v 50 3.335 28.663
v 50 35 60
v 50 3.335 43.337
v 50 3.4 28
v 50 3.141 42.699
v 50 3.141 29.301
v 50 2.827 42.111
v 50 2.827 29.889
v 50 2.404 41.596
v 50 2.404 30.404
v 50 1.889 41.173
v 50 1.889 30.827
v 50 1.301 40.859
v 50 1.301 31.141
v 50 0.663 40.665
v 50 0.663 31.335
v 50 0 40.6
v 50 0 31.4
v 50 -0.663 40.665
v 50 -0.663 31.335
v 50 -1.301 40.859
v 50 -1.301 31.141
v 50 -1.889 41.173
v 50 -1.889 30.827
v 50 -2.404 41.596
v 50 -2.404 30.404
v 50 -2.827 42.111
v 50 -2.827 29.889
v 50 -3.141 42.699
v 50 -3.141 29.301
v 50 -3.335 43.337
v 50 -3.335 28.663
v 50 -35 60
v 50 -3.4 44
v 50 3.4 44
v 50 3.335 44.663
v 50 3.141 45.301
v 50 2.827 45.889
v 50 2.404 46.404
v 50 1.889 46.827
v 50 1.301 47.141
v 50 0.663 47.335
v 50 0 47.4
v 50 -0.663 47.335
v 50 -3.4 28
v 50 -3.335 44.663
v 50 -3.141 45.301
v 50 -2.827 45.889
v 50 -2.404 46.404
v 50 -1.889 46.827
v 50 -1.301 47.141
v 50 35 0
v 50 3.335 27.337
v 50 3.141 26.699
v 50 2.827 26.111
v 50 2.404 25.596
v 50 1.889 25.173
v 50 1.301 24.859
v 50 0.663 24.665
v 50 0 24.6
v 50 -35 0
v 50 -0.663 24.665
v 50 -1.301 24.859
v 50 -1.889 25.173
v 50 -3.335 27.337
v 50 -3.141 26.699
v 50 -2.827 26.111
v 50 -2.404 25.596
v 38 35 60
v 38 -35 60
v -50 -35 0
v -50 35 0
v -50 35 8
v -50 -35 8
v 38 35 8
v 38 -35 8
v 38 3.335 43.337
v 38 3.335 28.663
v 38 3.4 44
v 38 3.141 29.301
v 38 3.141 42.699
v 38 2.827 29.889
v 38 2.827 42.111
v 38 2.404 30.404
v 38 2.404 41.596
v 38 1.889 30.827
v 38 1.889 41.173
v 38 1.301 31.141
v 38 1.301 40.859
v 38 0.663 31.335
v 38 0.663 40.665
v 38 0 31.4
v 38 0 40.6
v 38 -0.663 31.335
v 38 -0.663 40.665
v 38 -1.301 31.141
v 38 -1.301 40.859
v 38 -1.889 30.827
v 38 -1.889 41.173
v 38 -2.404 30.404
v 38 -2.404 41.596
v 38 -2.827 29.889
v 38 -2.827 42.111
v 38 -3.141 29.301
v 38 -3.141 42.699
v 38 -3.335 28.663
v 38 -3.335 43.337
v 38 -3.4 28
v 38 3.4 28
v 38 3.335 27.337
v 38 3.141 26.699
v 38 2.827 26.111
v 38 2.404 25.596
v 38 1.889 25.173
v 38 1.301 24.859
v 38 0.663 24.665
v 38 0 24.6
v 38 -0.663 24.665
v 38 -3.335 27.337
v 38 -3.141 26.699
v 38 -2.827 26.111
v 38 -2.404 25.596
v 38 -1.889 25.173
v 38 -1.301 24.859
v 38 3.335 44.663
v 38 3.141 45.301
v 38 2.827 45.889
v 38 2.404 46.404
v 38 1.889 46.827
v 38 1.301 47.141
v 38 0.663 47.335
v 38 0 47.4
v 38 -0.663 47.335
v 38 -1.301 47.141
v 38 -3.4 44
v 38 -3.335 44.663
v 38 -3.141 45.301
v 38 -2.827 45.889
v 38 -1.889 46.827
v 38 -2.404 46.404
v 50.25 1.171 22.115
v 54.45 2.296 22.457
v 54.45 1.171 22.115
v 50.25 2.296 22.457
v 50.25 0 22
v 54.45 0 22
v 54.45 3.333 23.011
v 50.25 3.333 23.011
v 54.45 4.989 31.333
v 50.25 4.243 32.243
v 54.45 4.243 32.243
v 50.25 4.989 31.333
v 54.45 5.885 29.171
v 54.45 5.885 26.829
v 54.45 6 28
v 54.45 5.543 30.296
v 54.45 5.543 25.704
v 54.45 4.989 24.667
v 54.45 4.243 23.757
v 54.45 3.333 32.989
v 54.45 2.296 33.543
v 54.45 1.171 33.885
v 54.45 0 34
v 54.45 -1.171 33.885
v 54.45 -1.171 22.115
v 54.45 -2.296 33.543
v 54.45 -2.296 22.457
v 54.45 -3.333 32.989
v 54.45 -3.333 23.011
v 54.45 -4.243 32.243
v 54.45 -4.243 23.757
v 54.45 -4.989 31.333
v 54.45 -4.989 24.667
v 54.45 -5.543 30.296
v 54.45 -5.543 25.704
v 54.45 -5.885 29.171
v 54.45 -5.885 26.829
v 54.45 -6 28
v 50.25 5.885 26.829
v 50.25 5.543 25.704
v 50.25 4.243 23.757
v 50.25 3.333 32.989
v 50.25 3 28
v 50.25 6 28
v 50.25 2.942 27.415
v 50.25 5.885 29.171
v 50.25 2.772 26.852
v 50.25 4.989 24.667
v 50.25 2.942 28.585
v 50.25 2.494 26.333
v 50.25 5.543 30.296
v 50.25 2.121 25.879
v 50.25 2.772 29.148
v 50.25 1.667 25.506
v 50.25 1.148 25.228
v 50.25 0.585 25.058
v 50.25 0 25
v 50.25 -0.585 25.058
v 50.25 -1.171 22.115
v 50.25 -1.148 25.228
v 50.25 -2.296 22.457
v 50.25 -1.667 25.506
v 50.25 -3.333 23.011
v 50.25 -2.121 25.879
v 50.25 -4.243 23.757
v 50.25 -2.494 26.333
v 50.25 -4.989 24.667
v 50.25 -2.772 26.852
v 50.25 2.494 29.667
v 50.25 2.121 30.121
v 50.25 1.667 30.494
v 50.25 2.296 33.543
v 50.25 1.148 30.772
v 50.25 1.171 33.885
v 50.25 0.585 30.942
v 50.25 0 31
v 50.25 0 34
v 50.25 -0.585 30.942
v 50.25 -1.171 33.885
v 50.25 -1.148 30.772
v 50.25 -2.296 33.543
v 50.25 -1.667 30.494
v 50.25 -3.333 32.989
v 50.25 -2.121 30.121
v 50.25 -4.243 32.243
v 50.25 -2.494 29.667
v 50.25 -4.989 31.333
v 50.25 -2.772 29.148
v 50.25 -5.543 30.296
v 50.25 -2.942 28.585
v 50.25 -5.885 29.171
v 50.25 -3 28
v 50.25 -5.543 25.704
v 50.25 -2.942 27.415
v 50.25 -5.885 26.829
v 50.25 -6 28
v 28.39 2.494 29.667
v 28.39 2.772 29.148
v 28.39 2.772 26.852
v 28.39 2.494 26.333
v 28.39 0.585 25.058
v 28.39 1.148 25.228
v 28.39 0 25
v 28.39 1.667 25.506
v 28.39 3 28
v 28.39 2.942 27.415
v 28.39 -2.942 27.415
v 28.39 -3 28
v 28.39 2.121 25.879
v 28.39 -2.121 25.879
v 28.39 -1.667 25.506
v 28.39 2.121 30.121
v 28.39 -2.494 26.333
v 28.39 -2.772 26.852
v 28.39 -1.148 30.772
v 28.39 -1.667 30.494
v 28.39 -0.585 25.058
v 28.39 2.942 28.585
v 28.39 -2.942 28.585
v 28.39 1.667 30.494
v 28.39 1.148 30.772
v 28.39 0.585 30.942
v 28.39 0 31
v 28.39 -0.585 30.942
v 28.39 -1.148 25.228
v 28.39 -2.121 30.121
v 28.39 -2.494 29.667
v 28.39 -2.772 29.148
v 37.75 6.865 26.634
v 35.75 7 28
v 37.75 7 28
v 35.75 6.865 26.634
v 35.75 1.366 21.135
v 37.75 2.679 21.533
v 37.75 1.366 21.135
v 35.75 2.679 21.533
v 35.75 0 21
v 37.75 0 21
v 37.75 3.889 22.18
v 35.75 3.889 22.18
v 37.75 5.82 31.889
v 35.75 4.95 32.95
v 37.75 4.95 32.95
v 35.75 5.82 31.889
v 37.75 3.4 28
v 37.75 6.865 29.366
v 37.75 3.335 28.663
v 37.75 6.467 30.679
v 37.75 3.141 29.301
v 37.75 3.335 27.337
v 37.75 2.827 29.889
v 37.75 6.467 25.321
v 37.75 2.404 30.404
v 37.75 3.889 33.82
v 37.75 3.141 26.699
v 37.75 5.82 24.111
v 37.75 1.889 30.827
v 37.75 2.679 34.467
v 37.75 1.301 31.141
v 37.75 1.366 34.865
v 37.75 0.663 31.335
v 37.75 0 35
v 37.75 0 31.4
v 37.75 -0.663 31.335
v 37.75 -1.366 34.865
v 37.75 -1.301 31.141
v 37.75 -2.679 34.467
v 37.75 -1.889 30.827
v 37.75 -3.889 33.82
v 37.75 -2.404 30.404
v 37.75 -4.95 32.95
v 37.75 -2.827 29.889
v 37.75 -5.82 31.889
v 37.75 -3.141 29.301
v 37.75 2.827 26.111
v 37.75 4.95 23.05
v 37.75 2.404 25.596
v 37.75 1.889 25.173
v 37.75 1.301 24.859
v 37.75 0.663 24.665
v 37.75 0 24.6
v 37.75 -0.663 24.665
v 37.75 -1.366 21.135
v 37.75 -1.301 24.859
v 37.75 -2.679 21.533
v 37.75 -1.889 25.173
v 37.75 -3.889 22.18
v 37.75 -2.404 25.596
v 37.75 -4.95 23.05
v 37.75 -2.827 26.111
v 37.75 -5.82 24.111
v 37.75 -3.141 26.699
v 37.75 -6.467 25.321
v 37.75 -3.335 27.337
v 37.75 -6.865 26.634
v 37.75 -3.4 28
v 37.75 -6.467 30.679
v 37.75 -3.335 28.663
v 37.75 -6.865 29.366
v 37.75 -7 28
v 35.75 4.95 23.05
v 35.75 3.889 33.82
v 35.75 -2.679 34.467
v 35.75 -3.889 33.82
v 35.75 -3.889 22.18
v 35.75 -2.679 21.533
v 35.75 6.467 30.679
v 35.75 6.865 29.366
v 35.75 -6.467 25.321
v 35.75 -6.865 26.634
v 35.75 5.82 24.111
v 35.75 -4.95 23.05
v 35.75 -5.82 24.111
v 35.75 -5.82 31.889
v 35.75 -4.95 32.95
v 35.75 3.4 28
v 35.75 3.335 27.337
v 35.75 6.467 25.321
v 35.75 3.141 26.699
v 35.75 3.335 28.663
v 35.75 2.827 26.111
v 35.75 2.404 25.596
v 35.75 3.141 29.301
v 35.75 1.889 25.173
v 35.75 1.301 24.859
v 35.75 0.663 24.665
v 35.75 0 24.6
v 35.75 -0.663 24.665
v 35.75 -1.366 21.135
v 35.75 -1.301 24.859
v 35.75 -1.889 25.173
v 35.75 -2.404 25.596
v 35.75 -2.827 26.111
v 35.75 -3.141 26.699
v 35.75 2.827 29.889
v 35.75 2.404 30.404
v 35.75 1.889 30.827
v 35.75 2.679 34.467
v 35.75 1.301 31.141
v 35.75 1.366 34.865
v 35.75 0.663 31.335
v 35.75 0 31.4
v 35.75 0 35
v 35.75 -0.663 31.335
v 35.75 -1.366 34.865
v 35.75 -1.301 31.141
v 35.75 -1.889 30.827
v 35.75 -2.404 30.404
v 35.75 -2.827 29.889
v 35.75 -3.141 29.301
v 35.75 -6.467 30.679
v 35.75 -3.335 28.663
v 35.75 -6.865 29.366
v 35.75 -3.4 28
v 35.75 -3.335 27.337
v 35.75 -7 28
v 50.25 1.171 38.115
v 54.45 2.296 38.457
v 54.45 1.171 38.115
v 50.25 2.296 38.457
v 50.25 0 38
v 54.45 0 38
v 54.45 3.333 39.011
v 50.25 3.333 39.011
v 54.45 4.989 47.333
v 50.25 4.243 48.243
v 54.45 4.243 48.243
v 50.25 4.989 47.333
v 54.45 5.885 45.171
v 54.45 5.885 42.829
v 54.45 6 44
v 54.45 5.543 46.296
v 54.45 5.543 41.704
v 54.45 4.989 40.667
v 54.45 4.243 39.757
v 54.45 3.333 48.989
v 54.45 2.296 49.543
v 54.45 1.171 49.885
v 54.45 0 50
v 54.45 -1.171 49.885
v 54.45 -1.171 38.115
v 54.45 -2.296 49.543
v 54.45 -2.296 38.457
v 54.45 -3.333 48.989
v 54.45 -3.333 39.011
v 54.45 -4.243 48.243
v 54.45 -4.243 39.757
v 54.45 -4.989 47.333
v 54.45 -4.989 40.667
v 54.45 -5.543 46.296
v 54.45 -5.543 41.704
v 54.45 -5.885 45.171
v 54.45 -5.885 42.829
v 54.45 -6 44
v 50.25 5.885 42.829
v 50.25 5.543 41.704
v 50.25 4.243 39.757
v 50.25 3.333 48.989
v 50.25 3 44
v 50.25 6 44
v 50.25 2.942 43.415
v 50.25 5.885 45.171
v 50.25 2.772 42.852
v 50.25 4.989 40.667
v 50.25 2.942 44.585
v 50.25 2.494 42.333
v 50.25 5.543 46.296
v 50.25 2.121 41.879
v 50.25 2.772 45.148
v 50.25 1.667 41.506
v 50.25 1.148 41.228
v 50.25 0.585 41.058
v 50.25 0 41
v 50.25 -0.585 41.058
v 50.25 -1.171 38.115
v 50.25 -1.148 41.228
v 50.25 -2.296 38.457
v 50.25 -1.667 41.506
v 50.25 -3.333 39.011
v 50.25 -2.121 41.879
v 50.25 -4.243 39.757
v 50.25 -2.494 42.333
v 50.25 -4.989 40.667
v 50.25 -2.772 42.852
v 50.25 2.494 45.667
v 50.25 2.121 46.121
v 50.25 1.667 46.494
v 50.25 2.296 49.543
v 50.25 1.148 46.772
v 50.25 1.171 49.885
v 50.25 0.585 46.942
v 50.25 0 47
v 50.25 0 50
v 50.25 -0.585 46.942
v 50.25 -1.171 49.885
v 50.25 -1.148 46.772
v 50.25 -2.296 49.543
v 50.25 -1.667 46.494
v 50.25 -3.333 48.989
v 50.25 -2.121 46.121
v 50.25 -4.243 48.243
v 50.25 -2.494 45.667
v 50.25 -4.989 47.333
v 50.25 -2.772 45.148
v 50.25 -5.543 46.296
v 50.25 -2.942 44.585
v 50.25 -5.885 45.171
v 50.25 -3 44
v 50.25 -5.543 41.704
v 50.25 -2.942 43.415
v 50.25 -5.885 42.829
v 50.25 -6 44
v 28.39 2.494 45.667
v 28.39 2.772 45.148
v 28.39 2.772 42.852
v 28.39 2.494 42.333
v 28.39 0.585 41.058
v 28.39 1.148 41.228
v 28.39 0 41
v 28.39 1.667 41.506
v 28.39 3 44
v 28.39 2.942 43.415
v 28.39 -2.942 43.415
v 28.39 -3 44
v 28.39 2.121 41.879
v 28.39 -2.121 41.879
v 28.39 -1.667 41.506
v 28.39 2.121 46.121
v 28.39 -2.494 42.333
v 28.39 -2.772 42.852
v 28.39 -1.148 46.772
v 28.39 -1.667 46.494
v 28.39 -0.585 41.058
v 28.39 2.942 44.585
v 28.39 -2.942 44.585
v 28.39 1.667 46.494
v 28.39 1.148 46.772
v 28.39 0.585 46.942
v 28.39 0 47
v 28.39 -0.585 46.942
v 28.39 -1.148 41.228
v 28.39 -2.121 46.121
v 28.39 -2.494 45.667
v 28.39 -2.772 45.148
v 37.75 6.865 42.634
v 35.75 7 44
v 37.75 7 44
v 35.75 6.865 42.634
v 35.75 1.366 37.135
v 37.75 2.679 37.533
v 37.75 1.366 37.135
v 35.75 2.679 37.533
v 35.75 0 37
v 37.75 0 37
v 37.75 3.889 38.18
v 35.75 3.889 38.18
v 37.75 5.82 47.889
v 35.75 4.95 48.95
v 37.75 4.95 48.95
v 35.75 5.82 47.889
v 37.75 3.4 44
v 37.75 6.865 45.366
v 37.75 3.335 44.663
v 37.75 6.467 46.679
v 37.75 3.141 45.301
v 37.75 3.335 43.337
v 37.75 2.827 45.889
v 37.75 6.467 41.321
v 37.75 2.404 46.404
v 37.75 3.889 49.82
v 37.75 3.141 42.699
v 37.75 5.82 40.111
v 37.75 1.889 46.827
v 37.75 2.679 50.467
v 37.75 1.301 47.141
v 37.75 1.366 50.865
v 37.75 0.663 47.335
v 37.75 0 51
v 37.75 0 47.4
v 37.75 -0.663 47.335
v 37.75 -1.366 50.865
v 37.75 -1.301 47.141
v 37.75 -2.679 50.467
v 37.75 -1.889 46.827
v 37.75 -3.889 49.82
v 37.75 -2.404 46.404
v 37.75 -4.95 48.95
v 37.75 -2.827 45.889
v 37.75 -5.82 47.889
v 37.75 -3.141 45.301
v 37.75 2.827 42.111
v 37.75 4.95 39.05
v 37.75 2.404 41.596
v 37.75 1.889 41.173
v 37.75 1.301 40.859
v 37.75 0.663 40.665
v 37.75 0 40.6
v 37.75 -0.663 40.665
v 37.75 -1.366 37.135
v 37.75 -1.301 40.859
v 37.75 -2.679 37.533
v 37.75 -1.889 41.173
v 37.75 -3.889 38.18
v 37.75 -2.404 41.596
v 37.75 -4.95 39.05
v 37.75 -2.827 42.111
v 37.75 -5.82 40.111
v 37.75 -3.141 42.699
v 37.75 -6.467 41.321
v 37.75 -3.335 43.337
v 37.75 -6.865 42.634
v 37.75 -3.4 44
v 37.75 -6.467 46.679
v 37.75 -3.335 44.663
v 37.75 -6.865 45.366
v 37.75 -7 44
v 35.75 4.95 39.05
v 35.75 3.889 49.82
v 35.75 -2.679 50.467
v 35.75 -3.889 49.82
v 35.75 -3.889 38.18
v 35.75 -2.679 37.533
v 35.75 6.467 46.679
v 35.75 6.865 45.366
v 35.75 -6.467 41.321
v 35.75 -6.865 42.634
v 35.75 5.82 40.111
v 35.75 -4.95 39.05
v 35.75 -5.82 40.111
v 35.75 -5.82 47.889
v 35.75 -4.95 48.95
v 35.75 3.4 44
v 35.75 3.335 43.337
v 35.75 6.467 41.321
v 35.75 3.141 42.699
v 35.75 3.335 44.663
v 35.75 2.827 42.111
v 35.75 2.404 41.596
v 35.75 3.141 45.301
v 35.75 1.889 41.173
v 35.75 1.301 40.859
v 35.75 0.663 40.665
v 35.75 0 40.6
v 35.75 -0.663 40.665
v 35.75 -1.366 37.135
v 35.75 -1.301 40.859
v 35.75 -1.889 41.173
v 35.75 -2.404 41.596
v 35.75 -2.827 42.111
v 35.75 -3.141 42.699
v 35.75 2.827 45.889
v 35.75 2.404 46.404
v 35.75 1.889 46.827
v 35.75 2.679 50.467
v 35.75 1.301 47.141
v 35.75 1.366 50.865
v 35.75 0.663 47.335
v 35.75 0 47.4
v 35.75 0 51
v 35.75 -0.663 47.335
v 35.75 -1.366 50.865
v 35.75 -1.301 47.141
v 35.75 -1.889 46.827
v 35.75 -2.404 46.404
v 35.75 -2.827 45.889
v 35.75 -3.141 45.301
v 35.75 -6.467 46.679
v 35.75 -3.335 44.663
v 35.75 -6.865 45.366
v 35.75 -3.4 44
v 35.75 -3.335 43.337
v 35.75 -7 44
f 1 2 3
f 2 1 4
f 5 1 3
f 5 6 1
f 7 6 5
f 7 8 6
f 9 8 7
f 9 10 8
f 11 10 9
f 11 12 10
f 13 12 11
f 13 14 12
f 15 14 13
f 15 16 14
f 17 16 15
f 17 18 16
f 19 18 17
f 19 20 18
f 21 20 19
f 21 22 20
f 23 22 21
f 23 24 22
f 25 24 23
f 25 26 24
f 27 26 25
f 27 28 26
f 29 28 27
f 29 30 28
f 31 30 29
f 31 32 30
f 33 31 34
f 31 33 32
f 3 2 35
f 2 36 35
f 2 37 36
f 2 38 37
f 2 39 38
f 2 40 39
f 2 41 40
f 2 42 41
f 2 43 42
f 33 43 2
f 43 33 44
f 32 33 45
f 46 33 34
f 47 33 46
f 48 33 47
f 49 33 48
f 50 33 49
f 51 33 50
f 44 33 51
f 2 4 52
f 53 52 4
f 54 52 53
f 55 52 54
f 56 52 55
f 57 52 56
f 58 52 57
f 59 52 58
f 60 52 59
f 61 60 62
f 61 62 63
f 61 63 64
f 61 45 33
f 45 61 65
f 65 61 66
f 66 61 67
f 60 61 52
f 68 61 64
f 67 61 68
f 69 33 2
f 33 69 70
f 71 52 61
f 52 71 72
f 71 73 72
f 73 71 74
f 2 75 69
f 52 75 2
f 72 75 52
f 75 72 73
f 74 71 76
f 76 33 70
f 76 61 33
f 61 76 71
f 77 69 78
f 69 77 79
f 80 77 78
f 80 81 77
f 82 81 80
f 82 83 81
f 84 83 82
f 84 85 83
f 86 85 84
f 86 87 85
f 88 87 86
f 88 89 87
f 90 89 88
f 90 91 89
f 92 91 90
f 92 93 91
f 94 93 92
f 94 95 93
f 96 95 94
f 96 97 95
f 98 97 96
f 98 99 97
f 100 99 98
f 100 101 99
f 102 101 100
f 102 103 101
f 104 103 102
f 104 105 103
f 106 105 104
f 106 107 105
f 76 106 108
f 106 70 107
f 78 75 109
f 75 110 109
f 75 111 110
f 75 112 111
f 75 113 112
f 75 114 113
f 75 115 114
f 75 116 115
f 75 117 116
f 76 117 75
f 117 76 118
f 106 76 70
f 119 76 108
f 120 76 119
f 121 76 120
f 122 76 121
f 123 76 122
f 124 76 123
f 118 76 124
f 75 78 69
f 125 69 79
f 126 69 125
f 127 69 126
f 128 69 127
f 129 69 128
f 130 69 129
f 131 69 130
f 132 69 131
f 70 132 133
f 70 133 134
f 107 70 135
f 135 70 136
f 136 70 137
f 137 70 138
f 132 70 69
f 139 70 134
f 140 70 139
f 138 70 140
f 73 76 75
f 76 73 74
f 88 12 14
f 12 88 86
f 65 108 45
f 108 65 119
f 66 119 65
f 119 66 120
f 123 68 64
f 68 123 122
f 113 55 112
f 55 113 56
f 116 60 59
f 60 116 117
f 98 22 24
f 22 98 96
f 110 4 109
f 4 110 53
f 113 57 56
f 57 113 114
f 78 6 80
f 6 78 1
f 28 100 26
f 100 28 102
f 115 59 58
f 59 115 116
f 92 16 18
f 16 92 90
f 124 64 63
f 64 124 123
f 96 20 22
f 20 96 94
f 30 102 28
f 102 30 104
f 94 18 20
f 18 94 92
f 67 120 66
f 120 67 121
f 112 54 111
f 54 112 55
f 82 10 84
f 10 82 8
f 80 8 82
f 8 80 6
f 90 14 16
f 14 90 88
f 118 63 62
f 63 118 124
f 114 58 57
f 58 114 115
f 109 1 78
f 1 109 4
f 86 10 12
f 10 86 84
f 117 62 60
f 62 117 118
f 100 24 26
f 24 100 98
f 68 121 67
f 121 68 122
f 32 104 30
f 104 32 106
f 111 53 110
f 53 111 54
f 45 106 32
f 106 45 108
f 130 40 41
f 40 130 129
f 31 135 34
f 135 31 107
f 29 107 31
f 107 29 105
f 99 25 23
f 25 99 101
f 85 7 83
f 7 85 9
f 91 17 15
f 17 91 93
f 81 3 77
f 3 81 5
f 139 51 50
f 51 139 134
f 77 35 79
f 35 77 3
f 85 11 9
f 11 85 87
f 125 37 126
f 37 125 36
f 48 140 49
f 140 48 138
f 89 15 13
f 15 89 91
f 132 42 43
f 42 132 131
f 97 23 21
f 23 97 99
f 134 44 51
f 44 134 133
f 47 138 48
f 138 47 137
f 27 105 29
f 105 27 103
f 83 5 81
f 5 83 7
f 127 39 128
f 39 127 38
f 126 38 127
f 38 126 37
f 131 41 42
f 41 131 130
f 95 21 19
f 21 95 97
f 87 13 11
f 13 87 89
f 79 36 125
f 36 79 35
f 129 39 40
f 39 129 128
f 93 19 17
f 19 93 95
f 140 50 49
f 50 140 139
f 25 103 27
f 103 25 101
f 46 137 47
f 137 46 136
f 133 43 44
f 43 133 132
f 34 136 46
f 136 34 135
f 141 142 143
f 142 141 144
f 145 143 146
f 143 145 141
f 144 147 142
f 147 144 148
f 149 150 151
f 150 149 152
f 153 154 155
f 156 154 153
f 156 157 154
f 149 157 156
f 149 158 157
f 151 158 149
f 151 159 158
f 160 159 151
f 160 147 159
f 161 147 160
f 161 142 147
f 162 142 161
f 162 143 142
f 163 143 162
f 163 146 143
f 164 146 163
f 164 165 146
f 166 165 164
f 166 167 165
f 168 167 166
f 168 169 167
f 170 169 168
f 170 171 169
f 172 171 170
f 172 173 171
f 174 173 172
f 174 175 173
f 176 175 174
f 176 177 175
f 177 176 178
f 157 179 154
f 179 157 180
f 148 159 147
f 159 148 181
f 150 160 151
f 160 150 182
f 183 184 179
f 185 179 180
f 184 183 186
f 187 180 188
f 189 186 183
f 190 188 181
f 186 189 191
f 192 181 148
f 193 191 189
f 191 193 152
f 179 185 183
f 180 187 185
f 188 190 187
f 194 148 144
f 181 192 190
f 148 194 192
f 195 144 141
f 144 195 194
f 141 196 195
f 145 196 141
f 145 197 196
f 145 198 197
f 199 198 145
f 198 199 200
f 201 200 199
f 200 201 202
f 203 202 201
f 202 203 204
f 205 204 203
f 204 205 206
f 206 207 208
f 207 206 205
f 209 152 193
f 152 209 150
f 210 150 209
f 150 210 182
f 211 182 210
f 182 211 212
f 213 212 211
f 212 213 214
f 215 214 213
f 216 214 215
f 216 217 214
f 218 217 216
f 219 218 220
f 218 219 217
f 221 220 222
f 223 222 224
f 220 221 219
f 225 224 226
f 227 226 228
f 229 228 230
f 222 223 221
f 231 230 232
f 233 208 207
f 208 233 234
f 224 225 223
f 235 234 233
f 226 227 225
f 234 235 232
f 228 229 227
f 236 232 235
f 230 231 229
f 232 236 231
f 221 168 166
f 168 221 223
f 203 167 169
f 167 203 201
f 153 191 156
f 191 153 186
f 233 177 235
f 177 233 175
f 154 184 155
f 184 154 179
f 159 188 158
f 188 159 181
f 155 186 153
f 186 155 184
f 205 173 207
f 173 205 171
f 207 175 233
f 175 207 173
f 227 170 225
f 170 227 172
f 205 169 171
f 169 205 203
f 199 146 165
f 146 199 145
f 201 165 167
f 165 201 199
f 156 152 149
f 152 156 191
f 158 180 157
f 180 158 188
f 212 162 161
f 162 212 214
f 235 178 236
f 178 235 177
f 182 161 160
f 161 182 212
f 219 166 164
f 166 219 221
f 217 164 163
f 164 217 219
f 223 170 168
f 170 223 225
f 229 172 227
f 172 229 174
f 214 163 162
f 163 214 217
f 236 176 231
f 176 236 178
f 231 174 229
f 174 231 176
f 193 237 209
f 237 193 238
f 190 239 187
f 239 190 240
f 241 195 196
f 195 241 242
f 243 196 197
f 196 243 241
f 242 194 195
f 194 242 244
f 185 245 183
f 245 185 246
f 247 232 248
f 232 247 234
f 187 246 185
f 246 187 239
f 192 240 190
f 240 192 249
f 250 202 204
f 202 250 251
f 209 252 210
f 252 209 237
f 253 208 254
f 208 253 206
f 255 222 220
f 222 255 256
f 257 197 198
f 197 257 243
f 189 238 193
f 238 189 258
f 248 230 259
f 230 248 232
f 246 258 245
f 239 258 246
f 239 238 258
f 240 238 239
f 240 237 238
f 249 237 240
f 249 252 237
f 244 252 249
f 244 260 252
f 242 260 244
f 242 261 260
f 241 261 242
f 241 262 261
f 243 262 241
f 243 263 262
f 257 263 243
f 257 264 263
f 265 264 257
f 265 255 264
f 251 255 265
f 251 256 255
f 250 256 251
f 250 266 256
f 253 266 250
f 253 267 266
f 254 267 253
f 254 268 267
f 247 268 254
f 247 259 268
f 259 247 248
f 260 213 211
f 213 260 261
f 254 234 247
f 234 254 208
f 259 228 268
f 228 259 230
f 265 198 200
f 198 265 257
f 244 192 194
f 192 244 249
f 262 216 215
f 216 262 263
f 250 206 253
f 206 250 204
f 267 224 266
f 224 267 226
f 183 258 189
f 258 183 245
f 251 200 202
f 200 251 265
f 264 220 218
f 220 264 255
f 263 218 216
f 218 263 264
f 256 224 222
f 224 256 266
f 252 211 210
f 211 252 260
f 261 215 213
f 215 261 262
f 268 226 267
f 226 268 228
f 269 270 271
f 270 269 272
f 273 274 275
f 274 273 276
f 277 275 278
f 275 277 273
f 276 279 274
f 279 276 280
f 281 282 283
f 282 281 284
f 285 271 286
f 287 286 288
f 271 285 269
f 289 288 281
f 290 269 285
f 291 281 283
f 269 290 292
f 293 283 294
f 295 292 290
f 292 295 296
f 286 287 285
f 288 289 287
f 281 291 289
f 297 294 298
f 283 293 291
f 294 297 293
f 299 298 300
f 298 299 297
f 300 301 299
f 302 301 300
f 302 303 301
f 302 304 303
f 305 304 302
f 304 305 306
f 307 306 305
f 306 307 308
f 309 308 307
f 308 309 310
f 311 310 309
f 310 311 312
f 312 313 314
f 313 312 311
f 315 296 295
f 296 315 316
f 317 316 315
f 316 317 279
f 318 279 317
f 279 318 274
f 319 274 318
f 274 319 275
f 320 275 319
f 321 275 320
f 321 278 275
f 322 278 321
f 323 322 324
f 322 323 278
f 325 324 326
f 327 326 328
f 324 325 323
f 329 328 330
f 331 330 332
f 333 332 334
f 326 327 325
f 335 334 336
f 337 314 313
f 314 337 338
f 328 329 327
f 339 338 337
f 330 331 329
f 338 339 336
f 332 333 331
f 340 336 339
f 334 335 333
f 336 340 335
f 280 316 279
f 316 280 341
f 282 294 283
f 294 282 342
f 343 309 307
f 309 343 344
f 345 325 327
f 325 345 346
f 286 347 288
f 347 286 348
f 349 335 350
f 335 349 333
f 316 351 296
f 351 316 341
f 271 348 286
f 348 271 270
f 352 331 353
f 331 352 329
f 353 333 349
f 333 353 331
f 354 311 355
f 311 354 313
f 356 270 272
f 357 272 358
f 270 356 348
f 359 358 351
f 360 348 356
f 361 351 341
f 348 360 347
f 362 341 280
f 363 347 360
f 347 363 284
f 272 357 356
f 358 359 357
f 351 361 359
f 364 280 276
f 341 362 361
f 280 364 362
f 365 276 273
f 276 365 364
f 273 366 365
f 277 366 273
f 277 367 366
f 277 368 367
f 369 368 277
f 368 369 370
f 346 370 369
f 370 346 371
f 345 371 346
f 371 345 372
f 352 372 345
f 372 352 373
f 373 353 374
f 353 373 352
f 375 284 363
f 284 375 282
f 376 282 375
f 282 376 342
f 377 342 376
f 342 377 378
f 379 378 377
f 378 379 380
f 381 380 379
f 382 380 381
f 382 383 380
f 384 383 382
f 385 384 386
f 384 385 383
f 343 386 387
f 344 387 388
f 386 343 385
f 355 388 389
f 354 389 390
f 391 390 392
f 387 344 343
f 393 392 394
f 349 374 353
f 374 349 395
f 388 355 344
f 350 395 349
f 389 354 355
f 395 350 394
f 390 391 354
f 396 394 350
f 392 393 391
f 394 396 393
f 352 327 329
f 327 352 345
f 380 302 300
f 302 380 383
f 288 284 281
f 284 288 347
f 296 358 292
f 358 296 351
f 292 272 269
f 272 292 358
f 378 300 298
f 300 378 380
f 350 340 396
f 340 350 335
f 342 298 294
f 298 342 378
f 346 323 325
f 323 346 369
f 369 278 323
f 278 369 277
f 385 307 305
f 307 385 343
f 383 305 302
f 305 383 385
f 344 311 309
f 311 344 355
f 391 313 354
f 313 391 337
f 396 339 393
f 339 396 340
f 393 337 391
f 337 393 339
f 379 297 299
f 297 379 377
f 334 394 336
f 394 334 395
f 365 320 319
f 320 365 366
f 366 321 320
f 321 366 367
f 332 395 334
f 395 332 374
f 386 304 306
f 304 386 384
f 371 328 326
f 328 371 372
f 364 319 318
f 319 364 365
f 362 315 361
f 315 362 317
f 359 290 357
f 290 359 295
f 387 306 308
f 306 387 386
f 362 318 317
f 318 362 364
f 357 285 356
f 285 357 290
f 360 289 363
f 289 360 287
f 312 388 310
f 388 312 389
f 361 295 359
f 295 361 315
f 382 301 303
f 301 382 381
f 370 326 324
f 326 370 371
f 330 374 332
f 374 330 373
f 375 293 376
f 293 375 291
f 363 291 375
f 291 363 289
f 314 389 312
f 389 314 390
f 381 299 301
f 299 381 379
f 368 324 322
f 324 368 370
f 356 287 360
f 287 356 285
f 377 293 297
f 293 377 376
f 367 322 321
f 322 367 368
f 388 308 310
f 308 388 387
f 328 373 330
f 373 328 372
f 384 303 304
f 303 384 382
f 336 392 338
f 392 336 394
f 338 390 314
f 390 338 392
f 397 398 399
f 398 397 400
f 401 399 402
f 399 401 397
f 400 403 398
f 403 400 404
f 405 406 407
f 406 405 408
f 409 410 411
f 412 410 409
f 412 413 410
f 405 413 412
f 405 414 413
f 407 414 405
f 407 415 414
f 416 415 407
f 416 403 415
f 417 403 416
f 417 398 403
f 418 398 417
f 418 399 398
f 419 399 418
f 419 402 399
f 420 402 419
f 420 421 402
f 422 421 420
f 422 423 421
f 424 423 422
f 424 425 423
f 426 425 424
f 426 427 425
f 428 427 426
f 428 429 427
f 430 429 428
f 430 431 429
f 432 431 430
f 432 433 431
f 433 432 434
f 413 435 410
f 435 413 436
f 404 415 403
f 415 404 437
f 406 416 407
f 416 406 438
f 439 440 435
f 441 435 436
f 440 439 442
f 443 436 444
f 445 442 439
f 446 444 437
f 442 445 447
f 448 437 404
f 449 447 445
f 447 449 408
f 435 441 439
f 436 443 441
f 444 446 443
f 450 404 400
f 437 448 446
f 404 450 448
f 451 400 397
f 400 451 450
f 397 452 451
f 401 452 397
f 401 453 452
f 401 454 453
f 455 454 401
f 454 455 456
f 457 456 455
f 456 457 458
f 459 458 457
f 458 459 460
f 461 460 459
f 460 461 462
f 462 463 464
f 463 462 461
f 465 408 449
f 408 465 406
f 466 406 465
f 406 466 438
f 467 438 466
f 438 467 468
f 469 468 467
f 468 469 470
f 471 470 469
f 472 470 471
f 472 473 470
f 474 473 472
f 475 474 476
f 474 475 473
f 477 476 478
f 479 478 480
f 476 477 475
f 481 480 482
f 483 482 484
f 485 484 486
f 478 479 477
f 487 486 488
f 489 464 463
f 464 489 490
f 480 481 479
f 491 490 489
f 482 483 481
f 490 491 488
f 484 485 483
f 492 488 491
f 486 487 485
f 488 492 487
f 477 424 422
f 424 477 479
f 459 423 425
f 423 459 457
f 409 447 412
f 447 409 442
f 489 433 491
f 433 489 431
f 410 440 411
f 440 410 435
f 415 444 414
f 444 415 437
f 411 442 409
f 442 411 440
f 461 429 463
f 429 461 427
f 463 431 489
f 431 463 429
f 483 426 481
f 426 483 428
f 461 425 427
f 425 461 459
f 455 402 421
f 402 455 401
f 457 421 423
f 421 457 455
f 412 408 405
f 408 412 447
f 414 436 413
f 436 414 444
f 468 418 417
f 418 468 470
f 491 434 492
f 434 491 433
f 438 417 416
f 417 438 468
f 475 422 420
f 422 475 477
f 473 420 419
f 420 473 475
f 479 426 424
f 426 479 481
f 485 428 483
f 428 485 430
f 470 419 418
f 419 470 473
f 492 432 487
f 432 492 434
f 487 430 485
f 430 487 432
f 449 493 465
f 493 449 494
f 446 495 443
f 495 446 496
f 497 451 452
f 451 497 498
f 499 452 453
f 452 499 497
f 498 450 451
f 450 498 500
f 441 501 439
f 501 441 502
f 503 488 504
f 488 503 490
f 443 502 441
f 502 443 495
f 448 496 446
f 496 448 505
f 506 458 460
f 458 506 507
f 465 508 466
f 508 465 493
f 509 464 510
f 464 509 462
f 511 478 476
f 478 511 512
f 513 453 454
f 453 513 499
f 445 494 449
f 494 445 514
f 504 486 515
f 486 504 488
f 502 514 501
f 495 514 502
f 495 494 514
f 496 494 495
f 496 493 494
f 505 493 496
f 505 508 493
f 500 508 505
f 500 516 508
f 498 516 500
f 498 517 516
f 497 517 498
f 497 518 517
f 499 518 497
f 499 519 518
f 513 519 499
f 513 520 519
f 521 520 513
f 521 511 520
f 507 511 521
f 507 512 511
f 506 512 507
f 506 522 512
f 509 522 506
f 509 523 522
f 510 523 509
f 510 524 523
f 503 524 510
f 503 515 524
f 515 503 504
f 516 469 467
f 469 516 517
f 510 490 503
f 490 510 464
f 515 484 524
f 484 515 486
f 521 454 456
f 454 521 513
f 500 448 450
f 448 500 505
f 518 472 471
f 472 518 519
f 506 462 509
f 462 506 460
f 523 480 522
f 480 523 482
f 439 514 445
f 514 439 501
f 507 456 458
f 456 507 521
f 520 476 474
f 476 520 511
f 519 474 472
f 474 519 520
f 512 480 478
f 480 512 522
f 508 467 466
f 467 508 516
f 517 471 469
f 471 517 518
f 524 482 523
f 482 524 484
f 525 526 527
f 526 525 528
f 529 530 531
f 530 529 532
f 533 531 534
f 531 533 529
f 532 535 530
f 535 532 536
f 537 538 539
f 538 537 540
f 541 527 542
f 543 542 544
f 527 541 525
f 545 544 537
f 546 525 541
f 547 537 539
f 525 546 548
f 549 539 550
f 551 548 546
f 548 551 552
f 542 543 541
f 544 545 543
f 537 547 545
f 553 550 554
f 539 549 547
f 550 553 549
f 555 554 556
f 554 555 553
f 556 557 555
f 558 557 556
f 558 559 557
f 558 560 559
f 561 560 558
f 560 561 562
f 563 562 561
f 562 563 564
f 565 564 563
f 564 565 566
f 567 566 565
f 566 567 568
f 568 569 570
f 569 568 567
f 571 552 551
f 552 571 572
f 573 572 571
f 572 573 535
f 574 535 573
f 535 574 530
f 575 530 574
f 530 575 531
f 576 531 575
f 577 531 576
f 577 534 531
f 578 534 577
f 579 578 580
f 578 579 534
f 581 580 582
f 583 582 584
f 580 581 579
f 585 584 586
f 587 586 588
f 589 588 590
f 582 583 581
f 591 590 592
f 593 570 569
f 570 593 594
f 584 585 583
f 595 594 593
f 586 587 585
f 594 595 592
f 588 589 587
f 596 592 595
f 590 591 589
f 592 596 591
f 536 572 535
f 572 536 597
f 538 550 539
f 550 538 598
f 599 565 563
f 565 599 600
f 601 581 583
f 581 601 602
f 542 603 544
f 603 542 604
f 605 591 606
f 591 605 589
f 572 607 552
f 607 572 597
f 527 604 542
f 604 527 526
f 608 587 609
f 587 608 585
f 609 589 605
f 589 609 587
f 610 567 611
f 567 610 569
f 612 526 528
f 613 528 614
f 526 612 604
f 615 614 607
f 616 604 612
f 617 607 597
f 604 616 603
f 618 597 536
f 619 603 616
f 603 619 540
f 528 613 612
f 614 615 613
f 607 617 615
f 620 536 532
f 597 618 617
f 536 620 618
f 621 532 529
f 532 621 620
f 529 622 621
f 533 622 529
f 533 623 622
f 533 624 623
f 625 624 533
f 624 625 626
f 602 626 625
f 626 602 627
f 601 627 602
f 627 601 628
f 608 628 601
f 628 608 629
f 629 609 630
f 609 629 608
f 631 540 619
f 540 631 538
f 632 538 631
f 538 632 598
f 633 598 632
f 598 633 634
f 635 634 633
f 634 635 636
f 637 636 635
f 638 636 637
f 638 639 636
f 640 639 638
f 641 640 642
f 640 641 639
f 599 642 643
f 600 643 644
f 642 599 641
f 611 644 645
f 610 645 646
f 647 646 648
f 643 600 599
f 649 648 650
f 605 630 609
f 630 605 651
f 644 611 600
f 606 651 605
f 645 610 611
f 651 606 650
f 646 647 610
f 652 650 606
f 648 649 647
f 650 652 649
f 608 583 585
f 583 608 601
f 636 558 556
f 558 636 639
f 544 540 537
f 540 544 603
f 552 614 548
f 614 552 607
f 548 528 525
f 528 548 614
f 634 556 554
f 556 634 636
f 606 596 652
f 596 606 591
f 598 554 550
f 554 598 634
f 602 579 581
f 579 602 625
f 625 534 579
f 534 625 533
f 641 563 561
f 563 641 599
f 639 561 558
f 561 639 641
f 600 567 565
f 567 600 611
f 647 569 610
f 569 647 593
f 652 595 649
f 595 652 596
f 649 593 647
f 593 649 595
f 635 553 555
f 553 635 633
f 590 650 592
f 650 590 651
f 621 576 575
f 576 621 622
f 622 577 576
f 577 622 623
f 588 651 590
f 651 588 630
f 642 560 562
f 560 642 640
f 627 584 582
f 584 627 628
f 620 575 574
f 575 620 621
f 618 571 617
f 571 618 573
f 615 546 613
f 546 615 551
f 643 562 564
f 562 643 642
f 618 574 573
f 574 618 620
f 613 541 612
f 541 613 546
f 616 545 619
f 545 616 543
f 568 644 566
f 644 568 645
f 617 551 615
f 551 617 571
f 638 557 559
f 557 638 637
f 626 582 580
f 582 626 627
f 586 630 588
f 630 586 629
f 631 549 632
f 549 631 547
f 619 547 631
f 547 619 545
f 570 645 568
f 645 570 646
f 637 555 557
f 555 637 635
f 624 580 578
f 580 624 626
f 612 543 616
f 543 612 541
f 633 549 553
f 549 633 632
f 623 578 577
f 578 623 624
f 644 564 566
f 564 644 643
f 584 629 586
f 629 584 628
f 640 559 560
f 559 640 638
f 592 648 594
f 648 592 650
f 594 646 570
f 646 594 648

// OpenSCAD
$fn = 32;

// ------------------------------------------------------------------------
// Bolted bracket: 100 x 70 mm bracket with 2 bolt joints
// Every part is its own module, assembly() places them once.
// ------------------------------------------------------------------------

// --- part 1 ---
module bracket() {
  difference() {
    translate([-50, -35, 0]) cube([100, 70, 60]);
    translate([-51, -36, 8]) cube([89, 72, 53]);
    translate([44, 0, 28]) rotate([0, 90, 0]) cylinder(h = 14, d = 6.8, center = true);
    translate([44, 0, 44]) rotate([0, 90, 0]) cylinder(h = 14, d = 6.8, center = true);
  }
}

// --- part 2 ---
module bolt1() {
  cylinder(h = 4.2, d = 12);
  translate([0, 0, -21.86]) cylinder(h = 21.86, d = 6);
}

// --- part 3 ---
module washer1() {
  difference() {
      translate([0, 0, 0]) cylinder(h = 2, d = 14);
      translate([0, 0, -1]) cylinder(h = 4, d = 6.8);
    }
}

// --- part 4 ---
module bolt2() {
  cylinder(h = 4.2, d = 12);
  translate([0, 0, -21.86]) cylinder(h = 21.86, d = 6);
}

// --- part 5 ---
module washer2() {
  difference() {
      translate([0, 0, 0]) cylinder(h = 2, d = 14);
      translate([0, 0, -1]) cylinder(h = 4, d = 6.8);
    }
}

// --- assembly ---
module assembly() {
  translate([0, 0, 0]) rotate([0, 0, 0]) bracket();
  translate([50.25, 0, 28]) rotate([0, 90, 0]) bolt1();
  translate([35.75, 0, 28]) rotate([0, 90, 0]) washer1();
  translate([50.25, 0, 44]) rotate([0, 90, 0]) bolt2();
  translate([35.75, 0, 44]) rotate([0, 90, 0]) washer2();
}

assembly();
